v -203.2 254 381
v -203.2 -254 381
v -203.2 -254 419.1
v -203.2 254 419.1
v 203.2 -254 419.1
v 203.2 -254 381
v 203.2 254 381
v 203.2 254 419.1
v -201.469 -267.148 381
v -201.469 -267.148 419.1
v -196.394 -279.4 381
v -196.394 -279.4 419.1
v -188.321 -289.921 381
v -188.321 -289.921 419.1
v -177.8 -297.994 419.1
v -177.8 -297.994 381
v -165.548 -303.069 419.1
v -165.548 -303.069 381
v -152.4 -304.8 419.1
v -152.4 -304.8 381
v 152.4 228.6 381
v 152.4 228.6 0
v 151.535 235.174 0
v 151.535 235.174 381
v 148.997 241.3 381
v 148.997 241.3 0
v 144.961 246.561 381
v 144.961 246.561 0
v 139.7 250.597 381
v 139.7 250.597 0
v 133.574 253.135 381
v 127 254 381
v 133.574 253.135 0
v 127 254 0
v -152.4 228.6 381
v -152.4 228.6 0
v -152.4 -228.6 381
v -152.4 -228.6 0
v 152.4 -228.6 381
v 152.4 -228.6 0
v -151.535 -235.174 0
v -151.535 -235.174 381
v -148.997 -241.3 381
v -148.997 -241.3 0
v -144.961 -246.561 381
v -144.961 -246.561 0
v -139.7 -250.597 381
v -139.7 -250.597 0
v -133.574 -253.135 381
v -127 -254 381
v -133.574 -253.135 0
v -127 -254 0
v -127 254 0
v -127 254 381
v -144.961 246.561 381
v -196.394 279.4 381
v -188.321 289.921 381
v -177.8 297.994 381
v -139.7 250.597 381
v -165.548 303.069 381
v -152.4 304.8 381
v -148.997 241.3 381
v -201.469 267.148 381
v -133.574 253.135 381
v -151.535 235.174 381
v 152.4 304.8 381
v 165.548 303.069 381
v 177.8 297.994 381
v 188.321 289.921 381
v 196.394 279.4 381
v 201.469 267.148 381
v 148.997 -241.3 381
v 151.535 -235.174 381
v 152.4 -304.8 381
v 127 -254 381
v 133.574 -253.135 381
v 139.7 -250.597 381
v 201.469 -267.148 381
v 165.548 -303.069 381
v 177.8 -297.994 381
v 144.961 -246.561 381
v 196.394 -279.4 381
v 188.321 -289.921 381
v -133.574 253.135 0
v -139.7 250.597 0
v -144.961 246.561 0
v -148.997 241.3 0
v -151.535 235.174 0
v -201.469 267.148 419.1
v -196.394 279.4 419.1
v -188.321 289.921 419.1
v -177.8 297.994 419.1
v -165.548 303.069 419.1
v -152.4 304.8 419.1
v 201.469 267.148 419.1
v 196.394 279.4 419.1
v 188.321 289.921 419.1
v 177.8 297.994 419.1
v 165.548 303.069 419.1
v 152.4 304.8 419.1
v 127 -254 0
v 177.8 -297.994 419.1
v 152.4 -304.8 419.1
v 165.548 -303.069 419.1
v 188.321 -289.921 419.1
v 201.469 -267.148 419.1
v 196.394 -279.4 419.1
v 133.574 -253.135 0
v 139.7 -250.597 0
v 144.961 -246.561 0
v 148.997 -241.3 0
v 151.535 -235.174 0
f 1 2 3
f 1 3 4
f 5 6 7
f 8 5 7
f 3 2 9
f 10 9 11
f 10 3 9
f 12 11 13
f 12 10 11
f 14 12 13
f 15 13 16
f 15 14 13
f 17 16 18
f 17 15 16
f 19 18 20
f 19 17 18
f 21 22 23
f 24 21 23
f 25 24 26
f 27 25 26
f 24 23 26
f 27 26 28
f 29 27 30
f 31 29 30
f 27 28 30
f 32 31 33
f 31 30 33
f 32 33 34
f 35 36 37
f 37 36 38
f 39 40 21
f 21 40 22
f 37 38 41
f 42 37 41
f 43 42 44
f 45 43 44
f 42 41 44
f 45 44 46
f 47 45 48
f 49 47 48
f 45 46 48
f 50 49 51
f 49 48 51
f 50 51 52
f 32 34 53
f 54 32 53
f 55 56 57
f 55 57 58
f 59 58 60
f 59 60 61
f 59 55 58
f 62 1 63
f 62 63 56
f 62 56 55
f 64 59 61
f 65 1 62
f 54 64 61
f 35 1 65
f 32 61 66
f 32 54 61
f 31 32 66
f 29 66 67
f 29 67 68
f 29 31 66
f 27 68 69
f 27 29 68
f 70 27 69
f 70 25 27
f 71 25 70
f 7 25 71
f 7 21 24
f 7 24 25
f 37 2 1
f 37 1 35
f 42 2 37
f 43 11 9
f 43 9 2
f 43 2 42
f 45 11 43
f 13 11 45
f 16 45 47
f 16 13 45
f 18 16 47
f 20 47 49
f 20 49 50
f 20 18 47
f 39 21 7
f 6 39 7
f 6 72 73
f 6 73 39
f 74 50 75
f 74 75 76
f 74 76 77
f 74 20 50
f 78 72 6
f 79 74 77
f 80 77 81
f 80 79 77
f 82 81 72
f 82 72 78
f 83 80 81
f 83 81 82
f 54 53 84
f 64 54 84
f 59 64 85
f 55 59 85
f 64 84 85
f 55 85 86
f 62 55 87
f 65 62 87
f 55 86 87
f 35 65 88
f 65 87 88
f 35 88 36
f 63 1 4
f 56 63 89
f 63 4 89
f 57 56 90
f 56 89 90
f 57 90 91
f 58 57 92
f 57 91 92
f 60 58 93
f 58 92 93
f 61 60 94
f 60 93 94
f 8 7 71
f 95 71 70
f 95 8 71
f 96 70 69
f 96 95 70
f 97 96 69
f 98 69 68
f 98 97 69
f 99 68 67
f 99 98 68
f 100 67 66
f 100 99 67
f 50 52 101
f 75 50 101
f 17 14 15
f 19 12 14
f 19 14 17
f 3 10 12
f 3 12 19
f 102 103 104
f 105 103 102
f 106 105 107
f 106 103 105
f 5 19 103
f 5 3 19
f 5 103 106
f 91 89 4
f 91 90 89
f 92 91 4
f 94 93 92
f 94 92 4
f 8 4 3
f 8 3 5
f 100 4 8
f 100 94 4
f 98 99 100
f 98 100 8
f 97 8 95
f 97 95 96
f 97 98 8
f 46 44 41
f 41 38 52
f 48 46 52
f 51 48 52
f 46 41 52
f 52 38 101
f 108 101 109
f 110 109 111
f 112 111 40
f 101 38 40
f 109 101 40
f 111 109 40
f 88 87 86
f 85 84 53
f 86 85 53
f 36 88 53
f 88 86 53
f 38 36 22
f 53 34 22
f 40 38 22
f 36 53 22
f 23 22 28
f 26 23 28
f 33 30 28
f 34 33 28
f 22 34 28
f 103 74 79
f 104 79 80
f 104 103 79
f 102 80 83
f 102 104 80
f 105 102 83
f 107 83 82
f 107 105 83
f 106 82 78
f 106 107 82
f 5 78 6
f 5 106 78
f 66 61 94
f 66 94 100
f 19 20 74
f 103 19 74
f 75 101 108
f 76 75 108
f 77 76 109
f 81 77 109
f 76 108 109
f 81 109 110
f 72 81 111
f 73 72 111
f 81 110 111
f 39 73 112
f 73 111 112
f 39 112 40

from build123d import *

# Parameters (mm, degrees)
F0_W     = 406.4
F0_H     = 609.6
F1_DEPTH = 419.1
F2_R     = 50.8
F4_DEPTH = 381


with BuildPart() as f1:
    # F0 (on Top) → F1 (new body)
    with BuildSketch(Plane.XY):
        Rectangle(F0_W, F0_H)
    extrude(amount=F1_DEPTH)

    # F2
    f2_edges = [f1.edges().sort_by_distance(p)[0] for p in [
        (-203.2, 304.8, 209.55),
        (203.2, 304.8, 209.55),
        (-203.2, -304.8, 209.55),
        (203.2, -304.8, 209.55),
    ]]
    fillet(f2_edges, radius=F2_R)

    # F3 (on face) → F4 (cut)
    with BuildSketch(Plane(origin=(0, 0, 0), x_dir=(1, 0, 0), z_dir=(0, 0, -1))):
        with BuildLine():
            ThreePointArc((152.4, -304.8), (188.3210244843, -289.9210244843), (203.2, -254))
            Line((203.2, -254), (203.2, 254))
            ThreePointArc((203.2, 254), (188.3210244843, 289.9210244843), (152.4, 304.8))
            Line((152.4, 304.8), (-152.4, 304.8))
            ThreePointArc((-152.4, 304.8), (-188.3210244843, 289.9210244843), (-203.2, 254))
            Line((-203.2, 254), (-203.2, -254))
            ThreePointArc((-203.2, -254), (-188.3210244843, -289.9210244843), (-152.4, -304.8))
            Line((-152.4, -304.8), (152.4, -304.8))
        make_face()
        with BuildLine():
            Line((-127, 254), (127, 254))
            ThreePointArc((127, 254), (144.9605122421, 246.5605122421), (152.4, 228.6))
            Line((152.4, 228.6), (152.4, -228.6))
            ThreePointArc((152.4, -228.6), (144.9605122421, -246.5605122421), (127, -254))
            Line((127, -254), (-127, -254))
            ThreePointArc((-127, -254), (-144.9605122421, -246.5605122421), (-152.4, -228.6))
            Line((-152.4, -228.6), (-152.4, 228.6))
            ThreePointArc((-152.4, 228.6), (-144.9605122421, 246.5605122421), (-127, 254))
        make_face(mode=Mode.SUBTRACT)
    extrude(amount=-F4_DEPTH, mode=Mode.SUBTRACT)


solid = f1.part
